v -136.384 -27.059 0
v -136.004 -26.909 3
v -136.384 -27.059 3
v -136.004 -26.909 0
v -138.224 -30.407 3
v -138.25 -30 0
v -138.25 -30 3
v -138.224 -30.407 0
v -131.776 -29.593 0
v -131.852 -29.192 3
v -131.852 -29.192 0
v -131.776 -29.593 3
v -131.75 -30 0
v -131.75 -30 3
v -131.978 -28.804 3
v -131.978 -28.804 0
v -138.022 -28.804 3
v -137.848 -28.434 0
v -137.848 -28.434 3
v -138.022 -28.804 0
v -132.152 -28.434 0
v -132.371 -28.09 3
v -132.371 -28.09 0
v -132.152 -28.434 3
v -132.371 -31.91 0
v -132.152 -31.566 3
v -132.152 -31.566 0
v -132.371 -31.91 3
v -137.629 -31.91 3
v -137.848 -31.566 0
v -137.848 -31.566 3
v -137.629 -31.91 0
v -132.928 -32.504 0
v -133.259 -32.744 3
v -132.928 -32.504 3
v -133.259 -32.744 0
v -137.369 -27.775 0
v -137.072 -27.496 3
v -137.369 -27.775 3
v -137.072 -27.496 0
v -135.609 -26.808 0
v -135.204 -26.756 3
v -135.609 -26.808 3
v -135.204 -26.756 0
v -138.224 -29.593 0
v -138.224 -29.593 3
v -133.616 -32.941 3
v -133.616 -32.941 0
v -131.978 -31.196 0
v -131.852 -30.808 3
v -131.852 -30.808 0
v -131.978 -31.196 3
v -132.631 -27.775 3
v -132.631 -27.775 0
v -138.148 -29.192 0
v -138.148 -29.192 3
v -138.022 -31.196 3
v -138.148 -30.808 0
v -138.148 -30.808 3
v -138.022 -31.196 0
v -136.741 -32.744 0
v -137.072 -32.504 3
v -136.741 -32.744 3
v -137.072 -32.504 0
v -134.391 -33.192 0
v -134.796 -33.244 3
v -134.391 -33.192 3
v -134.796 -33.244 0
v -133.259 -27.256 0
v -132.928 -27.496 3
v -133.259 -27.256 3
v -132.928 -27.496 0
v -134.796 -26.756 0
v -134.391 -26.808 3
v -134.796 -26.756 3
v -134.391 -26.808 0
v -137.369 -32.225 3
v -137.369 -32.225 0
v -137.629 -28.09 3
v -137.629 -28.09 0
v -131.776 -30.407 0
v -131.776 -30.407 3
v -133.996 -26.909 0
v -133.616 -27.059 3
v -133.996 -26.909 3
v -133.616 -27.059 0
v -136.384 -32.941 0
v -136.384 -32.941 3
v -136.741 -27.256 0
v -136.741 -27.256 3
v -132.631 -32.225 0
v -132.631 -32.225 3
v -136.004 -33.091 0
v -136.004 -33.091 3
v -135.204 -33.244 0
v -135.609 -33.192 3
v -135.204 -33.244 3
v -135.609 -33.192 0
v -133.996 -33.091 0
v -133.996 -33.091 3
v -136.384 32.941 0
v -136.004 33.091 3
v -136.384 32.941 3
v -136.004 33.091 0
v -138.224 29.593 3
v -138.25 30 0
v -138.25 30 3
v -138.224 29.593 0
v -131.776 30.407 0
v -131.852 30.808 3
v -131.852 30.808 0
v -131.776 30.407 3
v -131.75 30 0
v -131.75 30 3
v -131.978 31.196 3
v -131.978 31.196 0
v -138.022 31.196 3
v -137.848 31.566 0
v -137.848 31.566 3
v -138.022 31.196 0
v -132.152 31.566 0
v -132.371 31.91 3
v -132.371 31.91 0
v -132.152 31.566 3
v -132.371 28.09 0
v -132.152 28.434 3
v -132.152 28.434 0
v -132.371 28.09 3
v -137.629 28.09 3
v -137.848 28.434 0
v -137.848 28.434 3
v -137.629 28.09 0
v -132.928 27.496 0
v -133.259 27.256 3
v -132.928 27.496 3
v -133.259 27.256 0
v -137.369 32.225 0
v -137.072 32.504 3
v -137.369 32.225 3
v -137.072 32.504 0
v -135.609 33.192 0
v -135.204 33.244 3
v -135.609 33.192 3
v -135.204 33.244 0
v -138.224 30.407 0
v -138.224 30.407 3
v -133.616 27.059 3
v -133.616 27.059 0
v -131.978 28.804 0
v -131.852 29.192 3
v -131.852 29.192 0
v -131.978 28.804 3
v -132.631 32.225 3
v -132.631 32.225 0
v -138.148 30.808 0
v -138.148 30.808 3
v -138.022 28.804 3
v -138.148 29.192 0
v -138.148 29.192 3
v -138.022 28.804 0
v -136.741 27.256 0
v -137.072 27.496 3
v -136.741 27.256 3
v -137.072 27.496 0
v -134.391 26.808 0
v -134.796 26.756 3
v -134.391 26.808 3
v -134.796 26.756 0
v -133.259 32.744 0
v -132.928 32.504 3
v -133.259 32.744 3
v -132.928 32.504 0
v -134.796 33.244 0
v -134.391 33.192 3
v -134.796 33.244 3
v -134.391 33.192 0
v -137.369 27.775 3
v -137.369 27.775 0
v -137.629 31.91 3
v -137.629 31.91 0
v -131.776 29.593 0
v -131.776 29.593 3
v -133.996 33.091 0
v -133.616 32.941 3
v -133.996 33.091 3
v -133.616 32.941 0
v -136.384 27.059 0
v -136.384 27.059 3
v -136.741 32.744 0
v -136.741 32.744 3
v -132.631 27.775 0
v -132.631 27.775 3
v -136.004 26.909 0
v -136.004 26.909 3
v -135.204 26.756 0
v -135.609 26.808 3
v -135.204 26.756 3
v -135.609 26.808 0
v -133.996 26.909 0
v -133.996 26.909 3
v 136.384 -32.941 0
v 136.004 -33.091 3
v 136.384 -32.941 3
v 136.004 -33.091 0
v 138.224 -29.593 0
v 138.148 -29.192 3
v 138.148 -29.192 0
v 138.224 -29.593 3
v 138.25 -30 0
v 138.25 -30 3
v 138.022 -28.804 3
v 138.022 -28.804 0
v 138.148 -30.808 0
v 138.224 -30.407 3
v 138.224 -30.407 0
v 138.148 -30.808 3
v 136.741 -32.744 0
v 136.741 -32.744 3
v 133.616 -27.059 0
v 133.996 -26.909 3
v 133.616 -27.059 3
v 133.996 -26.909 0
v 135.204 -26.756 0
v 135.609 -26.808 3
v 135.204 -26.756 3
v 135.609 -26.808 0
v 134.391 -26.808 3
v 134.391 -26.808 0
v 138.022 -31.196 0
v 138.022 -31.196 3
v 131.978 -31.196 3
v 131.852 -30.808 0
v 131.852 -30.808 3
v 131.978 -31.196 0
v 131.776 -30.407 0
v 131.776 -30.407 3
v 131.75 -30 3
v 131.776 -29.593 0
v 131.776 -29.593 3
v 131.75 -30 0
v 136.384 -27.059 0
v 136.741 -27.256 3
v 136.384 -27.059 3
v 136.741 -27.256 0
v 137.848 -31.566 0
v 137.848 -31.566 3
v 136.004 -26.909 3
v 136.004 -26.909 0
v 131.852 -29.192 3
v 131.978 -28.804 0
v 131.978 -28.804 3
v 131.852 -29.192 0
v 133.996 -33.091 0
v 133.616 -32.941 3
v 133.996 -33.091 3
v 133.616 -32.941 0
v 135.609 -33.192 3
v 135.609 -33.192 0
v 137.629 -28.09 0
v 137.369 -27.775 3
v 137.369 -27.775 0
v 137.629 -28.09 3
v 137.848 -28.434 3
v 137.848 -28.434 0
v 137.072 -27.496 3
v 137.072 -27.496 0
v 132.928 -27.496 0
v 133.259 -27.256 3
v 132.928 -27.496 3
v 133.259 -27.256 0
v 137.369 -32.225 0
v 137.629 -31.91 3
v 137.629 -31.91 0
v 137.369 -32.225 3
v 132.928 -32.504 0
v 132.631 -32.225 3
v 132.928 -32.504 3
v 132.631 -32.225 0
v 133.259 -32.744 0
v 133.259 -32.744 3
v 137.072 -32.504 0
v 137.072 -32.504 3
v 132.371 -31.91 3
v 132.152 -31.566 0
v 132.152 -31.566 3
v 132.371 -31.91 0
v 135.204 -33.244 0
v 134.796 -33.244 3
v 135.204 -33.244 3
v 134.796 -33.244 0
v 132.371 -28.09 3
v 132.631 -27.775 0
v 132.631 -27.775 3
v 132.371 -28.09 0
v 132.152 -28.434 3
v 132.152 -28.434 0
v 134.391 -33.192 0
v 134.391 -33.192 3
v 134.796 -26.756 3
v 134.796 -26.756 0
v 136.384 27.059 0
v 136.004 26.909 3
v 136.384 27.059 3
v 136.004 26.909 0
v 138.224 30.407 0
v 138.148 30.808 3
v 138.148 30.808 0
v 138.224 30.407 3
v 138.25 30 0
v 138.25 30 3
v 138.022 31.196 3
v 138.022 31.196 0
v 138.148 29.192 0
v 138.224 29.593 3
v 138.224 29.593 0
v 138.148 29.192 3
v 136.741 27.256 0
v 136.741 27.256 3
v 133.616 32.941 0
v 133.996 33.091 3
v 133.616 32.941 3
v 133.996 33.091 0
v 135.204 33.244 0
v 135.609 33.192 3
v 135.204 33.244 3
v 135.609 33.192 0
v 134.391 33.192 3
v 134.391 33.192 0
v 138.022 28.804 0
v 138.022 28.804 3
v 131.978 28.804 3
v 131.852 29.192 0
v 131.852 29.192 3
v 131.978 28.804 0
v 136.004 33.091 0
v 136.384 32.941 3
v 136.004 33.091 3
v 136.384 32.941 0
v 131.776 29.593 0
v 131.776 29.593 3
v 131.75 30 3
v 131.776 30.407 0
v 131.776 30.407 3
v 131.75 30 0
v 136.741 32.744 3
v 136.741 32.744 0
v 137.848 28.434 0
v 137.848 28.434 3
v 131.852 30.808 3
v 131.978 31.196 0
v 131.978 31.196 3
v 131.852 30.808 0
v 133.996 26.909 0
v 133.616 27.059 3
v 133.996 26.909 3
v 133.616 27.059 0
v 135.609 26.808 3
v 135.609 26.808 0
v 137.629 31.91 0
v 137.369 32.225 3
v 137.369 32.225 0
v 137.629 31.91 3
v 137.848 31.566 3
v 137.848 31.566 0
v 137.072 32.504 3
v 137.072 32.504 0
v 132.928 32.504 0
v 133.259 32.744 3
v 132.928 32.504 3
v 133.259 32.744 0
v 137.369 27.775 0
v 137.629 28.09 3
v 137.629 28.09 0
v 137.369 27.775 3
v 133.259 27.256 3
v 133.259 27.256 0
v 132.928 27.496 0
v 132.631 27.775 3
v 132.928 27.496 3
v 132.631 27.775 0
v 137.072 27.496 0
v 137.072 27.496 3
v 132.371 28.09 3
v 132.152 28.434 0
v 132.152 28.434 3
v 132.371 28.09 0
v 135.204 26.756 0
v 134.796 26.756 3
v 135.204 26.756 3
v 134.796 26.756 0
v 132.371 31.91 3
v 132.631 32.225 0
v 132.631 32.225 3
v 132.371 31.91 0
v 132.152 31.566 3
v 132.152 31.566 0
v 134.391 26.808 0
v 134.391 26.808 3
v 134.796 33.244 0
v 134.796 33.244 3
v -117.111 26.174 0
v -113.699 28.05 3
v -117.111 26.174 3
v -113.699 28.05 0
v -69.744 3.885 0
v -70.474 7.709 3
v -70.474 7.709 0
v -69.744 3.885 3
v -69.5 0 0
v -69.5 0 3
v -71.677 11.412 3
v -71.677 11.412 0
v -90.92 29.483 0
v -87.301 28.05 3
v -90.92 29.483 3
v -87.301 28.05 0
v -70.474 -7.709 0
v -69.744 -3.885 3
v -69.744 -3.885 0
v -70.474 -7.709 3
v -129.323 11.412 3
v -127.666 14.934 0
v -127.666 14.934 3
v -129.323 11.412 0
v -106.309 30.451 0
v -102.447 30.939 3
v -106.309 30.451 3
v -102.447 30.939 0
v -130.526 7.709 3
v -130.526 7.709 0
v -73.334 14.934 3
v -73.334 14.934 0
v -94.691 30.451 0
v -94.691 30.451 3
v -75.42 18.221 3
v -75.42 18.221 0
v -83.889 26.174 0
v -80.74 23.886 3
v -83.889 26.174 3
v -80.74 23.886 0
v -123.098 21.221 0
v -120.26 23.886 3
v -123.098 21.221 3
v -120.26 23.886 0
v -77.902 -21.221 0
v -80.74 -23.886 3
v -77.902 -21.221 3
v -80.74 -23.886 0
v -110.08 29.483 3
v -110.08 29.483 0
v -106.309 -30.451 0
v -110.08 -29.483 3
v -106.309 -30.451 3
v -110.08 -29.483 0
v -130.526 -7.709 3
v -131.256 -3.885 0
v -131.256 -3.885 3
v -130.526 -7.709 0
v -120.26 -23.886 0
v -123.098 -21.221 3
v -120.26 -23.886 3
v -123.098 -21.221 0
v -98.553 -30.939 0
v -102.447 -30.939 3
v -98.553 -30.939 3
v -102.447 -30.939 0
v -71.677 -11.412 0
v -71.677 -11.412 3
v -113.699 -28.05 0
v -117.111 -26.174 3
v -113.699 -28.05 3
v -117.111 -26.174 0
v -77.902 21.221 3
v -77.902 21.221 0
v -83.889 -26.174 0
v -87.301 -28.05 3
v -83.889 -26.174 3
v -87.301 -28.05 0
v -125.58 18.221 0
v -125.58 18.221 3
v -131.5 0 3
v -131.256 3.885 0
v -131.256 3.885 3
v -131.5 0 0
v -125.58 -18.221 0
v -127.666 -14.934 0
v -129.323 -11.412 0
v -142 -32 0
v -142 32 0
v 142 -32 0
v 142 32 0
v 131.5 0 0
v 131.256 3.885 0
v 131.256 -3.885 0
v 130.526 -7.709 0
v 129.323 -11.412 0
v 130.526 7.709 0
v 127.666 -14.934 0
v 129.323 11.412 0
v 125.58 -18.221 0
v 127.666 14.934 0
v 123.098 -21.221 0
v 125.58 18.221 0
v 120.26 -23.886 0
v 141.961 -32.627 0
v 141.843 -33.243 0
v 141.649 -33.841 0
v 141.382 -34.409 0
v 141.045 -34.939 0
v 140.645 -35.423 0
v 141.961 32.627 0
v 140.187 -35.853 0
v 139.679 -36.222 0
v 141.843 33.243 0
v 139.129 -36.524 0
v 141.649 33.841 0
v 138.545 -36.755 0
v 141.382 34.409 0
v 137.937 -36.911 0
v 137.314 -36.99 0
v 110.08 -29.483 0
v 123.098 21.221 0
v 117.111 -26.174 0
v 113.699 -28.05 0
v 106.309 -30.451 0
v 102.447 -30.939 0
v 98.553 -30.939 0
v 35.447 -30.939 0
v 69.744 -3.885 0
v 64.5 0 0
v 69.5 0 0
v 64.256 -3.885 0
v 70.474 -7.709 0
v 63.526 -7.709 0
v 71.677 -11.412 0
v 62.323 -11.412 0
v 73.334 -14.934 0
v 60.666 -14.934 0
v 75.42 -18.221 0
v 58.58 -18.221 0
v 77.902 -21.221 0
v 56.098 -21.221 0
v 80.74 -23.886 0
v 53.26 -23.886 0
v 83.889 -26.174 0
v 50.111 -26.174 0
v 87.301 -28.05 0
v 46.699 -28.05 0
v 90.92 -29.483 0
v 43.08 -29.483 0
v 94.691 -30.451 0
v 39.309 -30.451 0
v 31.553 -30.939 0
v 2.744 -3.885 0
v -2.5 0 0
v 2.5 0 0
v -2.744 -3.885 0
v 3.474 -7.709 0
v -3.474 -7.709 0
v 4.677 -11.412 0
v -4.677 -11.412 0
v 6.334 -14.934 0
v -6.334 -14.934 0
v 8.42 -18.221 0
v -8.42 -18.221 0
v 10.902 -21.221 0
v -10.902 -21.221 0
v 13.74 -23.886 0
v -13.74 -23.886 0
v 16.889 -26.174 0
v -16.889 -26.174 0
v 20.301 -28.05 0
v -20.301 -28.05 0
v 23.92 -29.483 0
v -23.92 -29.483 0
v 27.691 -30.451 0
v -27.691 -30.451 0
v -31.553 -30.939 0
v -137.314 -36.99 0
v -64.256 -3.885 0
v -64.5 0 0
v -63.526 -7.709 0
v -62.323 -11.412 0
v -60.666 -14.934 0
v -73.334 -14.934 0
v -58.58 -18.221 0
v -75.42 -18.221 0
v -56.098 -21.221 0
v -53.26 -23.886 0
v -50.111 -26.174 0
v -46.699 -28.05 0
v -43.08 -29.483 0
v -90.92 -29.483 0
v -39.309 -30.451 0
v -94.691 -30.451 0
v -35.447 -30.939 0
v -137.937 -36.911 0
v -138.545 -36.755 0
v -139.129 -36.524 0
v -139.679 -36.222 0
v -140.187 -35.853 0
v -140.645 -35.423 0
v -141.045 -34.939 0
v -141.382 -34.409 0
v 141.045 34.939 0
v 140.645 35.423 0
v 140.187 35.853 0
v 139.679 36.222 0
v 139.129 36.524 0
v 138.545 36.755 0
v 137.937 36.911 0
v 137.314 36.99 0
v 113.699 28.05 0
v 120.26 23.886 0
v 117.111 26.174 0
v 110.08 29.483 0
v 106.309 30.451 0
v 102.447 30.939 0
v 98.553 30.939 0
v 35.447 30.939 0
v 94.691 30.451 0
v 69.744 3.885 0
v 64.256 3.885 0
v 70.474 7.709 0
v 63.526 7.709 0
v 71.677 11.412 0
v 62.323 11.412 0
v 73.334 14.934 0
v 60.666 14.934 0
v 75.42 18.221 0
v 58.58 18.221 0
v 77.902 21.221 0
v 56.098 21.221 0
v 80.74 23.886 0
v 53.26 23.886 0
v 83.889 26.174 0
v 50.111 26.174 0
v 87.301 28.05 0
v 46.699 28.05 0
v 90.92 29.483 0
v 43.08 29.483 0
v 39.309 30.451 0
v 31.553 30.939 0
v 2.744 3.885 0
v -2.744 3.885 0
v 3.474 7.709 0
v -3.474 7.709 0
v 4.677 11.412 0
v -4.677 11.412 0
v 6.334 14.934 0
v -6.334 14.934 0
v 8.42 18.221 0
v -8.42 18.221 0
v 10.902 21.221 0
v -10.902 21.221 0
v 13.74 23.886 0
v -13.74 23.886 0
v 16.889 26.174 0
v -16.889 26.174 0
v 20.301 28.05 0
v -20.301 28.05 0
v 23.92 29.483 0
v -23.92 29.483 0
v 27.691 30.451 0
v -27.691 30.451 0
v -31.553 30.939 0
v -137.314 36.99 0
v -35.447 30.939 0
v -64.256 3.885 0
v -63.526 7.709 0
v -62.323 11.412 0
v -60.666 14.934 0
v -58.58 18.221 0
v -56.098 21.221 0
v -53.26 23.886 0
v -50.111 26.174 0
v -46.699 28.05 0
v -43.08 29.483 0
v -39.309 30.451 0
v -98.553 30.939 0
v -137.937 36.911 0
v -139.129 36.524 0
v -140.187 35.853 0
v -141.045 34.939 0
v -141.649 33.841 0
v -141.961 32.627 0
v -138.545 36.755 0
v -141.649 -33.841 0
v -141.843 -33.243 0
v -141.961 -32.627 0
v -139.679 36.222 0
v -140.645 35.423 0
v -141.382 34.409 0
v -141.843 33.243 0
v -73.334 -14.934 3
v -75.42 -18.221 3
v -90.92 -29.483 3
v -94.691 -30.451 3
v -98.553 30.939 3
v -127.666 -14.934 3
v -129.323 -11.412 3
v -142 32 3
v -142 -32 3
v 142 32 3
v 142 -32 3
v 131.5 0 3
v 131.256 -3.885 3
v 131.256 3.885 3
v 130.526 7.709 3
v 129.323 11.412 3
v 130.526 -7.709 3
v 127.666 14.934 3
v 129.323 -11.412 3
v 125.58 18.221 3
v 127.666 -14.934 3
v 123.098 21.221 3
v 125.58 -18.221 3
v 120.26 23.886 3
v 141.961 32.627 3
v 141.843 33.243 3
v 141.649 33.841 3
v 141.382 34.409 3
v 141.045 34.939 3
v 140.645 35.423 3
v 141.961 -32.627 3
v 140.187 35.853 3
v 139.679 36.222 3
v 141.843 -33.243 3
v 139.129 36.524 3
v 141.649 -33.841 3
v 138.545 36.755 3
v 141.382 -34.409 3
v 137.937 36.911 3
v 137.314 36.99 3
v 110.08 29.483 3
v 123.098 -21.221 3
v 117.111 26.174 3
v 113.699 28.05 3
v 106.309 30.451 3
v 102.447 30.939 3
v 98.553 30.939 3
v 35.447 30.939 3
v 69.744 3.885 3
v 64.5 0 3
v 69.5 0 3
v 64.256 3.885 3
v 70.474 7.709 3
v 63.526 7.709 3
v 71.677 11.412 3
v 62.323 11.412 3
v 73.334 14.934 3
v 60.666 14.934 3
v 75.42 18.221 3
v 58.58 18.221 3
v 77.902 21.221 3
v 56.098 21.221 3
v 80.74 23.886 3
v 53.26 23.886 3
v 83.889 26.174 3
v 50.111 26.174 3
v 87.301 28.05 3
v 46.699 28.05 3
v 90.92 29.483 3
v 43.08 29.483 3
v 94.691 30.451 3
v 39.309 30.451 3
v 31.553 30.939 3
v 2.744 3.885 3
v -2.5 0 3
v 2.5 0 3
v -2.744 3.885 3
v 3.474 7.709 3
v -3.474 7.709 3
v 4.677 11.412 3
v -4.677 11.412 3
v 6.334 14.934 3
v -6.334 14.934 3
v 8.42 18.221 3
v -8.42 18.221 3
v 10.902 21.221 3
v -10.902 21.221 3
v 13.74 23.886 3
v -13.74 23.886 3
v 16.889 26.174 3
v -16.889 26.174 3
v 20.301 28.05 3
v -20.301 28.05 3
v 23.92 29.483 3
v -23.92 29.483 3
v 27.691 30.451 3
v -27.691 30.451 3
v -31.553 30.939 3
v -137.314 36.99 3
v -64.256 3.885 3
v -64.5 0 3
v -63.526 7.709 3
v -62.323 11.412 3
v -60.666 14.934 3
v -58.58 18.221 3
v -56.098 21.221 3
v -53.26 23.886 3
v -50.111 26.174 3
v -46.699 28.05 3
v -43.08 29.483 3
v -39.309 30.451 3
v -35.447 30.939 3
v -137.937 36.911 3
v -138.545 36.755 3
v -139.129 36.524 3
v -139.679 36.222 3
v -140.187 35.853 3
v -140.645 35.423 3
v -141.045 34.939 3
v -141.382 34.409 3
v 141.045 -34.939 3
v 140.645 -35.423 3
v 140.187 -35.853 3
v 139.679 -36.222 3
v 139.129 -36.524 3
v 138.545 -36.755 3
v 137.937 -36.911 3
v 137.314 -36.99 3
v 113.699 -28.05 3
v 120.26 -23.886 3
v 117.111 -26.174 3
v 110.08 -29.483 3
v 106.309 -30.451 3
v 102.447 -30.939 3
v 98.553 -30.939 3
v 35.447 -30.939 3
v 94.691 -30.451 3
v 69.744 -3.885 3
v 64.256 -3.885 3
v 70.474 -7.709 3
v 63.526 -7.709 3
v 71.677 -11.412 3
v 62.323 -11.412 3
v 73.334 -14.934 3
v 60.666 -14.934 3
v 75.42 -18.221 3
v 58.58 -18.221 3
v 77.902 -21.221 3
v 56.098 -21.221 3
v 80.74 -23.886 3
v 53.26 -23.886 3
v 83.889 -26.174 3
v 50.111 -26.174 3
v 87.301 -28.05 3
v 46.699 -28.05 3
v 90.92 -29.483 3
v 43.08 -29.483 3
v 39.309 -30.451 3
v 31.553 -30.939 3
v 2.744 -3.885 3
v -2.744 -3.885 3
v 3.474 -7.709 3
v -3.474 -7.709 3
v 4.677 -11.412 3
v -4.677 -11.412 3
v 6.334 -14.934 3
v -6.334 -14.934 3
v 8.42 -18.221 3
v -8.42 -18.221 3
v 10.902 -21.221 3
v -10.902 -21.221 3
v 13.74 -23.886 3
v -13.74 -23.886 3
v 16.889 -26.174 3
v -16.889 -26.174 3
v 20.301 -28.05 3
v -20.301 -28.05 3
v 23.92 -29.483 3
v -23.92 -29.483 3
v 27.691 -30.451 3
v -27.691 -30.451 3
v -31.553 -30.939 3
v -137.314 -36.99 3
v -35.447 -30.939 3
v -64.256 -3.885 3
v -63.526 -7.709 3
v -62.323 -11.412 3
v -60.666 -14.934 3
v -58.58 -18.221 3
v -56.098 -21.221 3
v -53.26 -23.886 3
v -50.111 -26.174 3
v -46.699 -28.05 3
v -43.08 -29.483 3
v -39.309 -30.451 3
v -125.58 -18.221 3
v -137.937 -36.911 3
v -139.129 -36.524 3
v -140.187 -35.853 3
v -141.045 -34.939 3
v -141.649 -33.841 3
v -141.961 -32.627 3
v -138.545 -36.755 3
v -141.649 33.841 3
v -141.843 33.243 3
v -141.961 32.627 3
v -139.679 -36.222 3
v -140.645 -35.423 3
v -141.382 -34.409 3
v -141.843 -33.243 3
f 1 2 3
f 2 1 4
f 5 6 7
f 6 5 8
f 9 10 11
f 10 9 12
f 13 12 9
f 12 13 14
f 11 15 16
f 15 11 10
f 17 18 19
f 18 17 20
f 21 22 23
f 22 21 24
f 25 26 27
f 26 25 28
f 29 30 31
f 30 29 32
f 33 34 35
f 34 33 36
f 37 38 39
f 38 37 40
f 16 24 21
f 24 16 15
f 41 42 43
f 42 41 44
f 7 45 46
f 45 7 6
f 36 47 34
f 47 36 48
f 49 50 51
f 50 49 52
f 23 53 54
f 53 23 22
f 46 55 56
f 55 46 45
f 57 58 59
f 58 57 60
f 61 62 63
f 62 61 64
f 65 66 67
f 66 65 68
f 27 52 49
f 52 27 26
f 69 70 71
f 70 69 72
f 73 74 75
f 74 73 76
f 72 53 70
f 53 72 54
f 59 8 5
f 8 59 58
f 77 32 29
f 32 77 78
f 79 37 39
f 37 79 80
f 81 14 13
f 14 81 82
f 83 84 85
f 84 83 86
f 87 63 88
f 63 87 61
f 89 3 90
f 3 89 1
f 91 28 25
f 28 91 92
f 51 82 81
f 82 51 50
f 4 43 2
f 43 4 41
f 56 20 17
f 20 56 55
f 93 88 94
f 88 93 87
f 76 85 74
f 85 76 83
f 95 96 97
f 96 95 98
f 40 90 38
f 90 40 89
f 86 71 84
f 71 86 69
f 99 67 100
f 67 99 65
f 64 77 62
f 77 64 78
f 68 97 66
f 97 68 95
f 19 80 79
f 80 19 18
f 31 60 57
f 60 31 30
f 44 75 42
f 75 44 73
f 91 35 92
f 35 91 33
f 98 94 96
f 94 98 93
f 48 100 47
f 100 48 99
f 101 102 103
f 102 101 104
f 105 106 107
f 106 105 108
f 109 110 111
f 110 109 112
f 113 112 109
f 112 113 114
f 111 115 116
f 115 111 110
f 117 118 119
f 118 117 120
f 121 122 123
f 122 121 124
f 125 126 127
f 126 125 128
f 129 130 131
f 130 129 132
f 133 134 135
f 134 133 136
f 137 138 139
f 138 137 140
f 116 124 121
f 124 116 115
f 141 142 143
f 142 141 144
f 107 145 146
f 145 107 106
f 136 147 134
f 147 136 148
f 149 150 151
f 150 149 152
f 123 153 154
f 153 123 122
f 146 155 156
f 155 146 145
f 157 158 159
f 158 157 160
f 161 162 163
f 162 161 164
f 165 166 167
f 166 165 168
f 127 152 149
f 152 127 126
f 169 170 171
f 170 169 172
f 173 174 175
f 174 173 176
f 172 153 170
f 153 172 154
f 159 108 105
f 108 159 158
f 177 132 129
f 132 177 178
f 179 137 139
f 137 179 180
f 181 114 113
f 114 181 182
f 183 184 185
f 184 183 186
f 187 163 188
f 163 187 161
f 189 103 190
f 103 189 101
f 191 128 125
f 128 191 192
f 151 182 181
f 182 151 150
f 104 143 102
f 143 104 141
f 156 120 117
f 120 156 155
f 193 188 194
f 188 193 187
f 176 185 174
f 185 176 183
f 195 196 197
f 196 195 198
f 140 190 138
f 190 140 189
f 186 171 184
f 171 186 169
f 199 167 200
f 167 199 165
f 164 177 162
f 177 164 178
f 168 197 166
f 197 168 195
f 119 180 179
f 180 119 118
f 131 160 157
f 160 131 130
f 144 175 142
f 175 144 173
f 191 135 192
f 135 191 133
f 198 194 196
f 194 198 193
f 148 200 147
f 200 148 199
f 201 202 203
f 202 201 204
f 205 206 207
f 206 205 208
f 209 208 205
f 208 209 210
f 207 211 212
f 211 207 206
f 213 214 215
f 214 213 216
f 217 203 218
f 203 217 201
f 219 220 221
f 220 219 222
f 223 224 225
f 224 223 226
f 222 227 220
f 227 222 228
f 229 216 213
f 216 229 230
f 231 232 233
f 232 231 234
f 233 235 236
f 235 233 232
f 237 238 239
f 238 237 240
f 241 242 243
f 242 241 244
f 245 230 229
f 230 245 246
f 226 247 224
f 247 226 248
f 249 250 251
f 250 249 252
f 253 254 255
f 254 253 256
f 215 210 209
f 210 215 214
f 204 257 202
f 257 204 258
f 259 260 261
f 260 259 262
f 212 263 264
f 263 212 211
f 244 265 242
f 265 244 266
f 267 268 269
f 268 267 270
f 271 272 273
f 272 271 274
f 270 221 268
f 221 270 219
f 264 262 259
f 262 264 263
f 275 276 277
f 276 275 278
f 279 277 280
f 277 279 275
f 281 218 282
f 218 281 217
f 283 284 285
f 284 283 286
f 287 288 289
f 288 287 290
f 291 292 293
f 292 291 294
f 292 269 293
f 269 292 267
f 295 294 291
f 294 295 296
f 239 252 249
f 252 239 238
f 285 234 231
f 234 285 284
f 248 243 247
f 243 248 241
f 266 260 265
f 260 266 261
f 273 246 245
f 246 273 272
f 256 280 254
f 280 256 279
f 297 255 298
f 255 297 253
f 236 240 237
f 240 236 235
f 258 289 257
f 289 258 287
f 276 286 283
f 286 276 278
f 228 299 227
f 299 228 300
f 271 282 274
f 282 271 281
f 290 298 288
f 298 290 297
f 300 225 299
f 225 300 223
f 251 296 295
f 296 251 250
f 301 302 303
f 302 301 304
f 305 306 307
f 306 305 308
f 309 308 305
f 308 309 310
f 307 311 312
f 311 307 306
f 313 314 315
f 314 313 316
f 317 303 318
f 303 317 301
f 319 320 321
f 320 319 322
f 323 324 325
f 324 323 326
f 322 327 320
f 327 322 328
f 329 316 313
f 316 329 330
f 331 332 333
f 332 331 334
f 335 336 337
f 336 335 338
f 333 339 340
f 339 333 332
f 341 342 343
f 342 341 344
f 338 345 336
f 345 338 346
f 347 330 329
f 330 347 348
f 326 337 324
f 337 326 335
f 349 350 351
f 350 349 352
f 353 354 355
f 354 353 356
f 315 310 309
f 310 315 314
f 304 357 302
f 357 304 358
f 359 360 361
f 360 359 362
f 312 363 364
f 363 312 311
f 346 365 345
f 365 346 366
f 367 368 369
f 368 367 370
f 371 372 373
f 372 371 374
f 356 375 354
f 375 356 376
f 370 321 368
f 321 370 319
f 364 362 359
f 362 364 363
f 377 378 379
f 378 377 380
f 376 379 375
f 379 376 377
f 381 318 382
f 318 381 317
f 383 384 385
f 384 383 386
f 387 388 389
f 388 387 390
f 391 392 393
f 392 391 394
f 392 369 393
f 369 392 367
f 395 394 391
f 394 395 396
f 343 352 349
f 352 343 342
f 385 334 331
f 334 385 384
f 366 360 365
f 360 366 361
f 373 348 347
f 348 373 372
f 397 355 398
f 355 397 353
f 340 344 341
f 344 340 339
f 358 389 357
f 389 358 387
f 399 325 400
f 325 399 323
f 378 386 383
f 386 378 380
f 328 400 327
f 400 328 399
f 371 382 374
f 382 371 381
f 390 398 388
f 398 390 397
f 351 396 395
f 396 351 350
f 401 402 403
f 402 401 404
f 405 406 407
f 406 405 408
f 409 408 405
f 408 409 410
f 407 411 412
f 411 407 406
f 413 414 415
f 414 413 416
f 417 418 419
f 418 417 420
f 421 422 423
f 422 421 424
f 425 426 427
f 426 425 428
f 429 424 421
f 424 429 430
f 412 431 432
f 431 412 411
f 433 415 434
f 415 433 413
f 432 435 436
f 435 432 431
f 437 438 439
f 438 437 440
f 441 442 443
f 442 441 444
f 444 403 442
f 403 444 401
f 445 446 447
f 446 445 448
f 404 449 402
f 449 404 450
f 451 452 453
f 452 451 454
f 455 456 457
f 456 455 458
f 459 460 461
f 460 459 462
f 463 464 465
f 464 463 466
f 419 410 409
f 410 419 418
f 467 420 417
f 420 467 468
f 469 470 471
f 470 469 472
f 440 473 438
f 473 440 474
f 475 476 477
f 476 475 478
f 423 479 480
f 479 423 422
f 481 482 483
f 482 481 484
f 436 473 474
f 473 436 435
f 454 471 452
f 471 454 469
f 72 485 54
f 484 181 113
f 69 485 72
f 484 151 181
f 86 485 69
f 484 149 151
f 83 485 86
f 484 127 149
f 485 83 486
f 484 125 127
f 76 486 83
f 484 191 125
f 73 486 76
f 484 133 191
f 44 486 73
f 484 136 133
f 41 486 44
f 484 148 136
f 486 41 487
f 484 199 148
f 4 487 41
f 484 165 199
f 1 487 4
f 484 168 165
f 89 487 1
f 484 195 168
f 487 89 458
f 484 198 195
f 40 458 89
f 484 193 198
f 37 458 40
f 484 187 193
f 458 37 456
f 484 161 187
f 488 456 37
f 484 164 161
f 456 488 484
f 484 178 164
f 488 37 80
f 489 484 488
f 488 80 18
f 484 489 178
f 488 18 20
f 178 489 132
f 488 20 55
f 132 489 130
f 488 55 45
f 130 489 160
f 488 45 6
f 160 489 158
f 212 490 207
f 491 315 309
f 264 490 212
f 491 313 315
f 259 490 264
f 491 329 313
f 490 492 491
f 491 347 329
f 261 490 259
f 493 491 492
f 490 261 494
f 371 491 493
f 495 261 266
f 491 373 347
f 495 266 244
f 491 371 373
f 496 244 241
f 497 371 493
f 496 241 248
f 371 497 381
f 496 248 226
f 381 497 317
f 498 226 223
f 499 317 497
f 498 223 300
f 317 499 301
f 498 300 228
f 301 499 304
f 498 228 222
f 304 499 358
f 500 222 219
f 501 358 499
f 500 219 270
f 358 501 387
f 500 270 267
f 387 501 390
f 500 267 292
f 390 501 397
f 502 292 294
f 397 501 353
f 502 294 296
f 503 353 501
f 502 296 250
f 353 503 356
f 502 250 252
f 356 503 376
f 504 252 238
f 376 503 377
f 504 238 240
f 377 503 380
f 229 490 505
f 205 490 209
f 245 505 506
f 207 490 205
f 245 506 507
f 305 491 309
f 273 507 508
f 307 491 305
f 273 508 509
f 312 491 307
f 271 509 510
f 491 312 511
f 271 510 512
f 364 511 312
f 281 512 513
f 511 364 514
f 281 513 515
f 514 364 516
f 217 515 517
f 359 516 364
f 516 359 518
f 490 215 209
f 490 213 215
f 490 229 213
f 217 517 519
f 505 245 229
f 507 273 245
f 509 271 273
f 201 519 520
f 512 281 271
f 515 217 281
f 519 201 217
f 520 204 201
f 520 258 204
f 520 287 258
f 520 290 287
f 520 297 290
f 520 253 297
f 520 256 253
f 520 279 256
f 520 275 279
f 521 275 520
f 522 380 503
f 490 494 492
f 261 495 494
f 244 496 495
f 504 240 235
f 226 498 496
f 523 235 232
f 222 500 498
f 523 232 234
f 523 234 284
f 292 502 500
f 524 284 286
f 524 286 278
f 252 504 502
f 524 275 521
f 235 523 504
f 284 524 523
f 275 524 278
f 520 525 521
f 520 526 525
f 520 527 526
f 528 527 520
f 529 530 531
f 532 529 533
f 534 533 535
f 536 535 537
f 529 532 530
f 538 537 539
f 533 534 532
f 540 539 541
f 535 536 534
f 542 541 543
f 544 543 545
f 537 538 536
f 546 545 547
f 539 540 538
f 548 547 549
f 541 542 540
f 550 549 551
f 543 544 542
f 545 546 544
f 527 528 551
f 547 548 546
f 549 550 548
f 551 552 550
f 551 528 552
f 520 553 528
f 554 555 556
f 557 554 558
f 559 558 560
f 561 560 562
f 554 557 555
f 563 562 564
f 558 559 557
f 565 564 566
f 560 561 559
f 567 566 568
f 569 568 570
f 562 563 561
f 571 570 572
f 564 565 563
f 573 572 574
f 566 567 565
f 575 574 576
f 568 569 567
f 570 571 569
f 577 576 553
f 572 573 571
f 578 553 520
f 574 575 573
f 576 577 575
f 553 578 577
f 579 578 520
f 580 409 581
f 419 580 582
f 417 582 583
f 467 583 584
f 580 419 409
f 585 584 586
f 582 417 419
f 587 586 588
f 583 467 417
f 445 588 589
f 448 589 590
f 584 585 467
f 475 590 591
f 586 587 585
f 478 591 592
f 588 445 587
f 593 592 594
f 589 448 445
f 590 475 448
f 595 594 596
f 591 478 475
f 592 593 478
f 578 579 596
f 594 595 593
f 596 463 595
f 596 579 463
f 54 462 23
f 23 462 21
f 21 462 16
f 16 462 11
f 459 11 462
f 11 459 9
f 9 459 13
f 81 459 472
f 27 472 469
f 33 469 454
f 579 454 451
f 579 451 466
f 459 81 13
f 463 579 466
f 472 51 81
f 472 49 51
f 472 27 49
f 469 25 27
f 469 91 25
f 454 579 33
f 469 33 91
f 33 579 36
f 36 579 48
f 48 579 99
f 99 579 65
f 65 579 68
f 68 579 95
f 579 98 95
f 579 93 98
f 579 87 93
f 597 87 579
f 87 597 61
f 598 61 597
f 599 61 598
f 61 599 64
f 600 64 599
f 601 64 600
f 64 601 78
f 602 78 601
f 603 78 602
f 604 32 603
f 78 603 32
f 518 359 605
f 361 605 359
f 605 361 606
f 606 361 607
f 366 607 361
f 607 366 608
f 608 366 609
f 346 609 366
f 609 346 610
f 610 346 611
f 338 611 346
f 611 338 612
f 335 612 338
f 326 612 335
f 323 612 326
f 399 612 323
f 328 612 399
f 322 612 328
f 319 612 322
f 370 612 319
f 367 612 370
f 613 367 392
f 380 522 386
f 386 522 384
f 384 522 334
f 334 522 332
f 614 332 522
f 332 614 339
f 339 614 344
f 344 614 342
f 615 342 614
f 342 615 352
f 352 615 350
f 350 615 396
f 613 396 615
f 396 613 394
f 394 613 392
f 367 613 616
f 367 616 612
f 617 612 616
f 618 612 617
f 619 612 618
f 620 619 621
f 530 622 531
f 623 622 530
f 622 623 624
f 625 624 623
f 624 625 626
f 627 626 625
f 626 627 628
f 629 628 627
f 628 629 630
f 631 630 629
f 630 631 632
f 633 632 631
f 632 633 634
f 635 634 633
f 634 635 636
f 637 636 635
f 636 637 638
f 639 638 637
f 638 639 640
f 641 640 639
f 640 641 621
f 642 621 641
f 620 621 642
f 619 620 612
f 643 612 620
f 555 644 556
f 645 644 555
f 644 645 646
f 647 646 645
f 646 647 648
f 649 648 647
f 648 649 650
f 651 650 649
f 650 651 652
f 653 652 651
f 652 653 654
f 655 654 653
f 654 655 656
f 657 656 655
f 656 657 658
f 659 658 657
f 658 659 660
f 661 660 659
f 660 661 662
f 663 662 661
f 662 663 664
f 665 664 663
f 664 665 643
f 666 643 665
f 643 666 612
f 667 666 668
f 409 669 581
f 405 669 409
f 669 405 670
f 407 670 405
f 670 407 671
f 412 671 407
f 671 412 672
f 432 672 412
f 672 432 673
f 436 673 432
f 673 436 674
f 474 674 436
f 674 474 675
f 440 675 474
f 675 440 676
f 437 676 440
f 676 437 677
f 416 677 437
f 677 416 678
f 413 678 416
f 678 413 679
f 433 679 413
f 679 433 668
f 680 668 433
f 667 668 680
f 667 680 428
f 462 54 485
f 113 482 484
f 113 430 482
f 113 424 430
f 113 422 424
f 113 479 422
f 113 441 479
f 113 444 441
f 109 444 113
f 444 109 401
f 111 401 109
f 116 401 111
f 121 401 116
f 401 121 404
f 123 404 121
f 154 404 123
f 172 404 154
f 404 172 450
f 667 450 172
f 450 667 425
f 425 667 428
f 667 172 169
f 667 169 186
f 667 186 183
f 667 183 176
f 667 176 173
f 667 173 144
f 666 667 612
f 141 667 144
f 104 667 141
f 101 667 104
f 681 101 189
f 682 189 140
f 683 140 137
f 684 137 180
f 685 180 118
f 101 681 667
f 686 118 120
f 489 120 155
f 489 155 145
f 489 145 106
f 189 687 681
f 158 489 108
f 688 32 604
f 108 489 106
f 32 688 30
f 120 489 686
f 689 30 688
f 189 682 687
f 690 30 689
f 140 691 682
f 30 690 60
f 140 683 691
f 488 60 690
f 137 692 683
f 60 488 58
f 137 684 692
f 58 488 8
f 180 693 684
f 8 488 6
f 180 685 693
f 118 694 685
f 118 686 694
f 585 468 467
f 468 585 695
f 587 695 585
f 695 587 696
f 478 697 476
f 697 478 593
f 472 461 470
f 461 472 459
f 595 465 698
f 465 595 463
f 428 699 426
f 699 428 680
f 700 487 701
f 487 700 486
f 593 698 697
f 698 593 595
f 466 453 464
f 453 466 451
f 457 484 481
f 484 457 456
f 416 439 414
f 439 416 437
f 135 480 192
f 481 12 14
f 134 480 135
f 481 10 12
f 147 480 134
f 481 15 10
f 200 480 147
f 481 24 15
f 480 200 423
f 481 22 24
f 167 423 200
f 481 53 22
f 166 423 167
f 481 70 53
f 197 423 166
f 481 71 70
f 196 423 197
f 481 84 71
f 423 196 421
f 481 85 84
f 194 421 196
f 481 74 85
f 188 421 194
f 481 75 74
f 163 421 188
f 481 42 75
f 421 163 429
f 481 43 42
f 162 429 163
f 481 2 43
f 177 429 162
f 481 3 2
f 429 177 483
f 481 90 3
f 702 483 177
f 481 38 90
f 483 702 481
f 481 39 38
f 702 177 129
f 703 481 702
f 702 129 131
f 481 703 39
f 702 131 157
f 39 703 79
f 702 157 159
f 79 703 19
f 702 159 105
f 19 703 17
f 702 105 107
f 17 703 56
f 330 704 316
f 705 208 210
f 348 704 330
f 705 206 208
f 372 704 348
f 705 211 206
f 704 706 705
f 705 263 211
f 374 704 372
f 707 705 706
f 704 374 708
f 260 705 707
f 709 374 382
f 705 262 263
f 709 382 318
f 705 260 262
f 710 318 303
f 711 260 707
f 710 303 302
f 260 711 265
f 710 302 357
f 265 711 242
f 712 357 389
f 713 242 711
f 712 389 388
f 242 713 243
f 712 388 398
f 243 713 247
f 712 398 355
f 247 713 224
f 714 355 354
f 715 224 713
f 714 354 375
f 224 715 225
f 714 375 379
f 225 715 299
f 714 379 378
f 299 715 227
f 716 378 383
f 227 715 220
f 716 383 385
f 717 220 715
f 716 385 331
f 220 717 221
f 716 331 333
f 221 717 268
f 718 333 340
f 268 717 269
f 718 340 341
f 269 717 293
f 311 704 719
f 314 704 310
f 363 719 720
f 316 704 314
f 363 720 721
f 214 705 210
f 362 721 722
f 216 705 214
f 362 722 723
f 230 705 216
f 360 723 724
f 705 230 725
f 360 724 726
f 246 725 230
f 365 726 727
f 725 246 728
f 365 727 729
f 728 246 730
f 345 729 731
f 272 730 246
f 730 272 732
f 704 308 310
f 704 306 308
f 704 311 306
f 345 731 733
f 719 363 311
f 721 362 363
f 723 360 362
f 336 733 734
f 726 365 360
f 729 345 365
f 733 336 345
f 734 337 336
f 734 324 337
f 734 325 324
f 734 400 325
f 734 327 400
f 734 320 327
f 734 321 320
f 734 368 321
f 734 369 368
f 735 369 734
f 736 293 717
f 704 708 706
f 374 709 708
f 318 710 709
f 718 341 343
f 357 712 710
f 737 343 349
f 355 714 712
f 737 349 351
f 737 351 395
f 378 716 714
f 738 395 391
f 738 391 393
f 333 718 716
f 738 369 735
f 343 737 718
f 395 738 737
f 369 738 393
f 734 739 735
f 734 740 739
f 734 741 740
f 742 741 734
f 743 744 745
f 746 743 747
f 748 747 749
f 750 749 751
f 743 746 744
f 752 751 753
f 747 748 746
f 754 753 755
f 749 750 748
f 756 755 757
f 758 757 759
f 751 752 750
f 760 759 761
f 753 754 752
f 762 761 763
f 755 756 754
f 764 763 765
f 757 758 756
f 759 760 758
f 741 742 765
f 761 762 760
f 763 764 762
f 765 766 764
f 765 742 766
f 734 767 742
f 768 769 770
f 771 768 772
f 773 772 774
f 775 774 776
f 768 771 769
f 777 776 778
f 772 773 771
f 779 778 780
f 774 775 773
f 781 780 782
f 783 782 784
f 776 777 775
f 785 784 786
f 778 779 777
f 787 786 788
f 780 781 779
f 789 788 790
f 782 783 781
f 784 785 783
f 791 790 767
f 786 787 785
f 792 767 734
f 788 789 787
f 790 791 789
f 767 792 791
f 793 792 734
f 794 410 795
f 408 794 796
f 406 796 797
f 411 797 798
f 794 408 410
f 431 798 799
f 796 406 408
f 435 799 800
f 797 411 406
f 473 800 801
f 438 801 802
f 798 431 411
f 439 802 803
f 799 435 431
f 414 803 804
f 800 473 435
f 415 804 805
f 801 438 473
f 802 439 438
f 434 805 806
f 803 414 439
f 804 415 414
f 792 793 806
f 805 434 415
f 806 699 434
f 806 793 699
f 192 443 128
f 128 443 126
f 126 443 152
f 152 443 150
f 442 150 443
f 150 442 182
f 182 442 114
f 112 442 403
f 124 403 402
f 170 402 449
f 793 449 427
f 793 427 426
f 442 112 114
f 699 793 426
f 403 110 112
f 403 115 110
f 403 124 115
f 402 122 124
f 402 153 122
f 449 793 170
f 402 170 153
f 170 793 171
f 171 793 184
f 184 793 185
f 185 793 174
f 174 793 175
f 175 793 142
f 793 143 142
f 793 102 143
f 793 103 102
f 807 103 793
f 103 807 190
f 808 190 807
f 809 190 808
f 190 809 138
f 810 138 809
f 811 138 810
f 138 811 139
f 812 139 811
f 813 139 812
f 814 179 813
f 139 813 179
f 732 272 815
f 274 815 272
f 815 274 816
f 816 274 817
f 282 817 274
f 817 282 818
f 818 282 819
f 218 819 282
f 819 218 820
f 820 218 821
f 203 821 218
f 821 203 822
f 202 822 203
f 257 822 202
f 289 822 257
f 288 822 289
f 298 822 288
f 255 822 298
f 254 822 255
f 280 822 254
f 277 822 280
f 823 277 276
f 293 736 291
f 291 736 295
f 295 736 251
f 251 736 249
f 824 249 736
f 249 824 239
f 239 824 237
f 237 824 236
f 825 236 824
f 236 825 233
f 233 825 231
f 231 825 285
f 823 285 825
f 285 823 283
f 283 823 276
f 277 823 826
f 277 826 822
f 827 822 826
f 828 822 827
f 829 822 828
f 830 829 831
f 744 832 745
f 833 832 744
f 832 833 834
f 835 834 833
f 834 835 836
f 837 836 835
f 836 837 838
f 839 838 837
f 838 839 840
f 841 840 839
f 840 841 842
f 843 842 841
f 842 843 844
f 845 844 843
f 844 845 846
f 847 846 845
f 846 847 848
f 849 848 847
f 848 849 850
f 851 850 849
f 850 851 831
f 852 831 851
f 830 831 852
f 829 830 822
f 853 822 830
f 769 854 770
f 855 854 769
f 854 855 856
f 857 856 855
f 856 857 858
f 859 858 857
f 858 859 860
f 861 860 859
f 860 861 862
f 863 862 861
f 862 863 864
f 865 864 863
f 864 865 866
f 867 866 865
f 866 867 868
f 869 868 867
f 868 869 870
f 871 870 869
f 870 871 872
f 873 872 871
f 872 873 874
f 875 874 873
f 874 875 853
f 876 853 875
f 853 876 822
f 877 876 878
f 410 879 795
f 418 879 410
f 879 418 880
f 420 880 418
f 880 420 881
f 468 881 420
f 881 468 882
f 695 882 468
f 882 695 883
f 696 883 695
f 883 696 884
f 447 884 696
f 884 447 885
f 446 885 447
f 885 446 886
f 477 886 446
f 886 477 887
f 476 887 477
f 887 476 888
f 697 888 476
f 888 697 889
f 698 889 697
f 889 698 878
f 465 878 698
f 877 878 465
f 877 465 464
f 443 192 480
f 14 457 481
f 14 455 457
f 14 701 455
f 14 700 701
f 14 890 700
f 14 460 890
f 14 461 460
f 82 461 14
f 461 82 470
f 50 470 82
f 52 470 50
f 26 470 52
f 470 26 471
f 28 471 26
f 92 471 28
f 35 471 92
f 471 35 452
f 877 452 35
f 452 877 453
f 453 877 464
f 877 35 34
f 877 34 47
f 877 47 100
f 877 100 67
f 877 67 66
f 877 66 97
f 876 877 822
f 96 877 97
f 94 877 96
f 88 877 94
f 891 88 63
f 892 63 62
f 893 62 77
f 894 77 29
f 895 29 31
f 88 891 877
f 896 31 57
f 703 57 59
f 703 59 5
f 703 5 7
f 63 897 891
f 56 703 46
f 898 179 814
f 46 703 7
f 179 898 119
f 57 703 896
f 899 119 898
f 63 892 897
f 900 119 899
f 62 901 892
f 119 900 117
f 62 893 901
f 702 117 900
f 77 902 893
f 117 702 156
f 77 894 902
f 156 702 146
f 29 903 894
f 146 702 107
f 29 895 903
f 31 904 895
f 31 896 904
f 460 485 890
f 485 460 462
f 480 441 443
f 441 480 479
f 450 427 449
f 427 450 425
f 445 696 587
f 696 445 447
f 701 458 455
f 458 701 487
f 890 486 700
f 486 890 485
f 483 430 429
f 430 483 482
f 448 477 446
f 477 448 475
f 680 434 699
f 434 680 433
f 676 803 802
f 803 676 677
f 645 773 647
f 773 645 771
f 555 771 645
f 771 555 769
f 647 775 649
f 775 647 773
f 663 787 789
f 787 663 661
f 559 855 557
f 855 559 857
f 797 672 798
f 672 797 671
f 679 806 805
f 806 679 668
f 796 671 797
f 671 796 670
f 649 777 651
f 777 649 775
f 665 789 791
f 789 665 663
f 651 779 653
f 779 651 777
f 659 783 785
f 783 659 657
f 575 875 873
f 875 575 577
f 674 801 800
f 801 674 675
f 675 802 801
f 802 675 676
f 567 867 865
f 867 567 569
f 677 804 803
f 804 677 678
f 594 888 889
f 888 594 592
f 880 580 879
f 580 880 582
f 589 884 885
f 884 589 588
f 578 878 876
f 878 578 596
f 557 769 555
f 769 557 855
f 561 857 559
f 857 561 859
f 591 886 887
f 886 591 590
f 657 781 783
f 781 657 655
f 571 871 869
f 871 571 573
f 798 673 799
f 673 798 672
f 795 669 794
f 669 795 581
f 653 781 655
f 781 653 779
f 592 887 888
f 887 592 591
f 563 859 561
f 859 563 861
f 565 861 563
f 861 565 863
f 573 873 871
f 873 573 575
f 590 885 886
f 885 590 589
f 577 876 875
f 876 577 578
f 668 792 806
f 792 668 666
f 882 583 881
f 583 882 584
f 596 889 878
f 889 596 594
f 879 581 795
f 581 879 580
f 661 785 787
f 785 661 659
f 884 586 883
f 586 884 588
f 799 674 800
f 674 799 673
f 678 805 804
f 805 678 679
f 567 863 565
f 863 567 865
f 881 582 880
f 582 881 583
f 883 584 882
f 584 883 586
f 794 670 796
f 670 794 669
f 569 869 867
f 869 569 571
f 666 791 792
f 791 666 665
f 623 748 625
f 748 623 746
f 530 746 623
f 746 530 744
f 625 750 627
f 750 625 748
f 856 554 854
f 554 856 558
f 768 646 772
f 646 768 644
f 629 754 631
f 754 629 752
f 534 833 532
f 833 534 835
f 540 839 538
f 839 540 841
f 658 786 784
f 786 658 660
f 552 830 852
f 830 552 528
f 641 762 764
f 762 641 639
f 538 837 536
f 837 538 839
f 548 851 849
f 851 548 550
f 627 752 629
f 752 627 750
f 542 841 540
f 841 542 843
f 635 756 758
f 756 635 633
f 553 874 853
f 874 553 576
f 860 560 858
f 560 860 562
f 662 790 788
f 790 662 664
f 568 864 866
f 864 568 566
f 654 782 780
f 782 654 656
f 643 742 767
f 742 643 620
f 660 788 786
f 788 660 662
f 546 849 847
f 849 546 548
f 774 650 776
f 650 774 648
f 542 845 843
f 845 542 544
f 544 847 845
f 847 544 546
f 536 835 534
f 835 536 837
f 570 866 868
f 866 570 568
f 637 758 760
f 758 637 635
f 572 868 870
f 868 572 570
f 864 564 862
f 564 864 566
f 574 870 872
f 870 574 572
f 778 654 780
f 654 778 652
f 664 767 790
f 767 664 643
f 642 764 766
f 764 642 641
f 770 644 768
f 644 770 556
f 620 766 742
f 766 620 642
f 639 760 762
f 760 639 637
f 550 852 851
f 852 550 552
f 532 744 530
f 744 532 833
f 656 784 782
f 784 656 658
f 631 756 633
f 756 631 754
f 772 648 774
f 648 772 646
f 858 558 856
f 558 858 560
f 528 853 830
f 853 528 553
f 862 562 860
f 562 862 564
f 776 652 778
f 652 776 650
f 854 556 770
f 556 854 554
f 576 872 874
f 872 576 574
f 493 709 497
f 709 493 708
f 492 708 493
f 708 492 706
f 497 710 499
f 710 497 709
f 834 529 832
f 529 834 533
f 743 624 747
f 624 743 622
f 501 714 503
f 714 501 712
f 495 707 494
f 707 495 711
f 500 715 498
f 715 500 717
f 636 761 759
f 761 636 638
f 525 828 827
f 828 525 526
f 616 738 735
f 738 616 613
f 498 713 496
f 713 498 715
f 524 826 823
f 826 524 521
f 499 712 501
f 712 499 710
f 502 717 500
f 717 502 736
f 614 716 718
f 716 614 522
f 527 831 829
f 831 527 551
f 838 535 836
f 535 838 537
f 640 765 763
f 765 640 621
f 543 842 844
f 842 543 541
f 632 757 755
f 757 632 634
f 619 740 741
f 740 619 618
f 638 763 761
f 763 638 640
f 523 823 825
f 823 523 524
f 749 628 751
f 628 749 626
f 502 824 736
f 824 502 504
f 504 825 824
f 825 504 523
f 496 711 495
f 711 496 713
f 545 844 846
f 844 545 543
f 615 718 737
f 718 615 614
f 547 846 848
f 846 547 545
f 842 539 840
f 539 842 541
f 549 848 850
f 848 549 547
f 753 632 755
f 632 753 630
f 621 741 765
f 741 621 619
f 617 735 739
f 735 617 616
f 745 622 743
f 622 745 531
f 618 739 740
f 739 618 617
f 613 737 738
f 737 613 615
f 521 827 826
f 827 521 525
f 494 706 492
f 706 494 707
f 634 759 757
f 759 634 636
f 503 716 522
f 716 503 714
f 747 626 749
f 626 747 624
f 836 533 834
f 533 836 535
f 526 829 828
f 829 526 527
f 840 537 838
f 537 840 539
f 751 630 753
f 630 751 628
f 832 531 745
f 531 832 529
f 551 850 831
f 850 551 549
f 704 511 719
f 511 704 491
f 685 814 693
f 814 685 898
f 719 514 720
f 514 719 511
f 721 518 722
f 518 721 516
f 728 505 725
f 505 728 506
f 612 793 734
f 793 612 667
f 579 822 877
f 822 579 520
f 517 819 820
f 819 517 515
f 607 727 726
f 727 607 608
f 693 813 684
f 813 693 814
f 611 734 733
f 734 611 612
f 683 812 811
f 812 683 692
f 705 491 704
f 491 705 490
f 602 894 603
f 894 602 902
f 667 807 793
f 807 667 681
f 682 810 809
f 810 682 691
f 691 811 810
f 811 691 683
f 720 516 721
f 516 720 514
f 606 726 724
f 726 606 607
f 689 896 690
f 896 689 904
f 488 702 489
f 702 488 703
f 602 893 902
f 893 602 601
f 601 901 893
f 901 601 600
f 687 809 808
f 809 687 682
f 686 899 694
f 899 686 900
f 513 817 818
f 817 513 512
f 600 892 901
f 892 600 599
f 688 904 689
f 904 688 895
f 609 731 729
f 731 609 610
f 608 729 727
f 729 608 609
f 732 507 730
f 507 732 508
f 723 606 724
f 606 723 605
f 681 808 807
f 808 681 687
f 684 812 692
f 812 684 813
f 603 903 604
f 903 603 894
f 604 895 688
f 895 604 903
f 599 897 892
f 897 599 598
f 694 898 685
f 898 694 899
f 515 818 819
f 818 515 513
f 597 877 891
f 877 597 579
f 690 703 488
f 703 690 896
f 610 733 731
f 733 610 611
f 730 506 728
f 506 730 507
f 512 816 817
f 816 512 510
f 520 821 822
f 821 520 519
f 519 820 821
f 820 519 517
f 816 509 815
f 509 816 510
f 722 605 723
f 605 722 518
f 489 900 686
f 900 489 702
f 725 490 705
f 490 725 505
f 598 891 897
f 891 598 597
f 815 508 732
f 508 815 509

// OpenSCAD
$fn = 50;


difference() {
	union() {
		hull() {
			translate(v = [-137.0000000000, 32.0000000000, 0]) {
				cylinder(h = 3, r = 5);
			}
			translate(v = [137.0000000000, 32.0000000000, 0]) {
				cylinder(h = 3, r = 5);
			}
			translate(v = [-137.0000000000, -32.0000000000, 0]) {
				cylinder(h = 3, r = 5);
			}
			translate(v = [137.0000000000, -32.0000000000, 0]) {
				cylinder(h = 3, r = 5);
			}
		}
	}
	union() {
		#translate(v = [-135.0000000000, -30.0000000000, -100.0000000000]) {
			cylinder(h = 200, r = 3.2500000000);
		}
		#translate(v = [-135.0000000000, 30.0000000000, -100.0000000000]) {
			cylinder(h = 200, r = 3.2500000000);
		}
		#translate(v = [135.0000000000, -30.0000000000, -100.0000000000]) {
			cylinder(h = 200, r = 3.2500000000);
		}
		#translate(v = [135.0000000000, 30.0000000000, -100.0000000000]) {
			cylinder(h = 200, r = 3.2500000000);
		}
		#translate(v = [-100.5000000000, 0, 0]) {
			cylinder(h = 3, r = 31.0000000000);
		}
		#translate(v = [-33.5000000000, 0, 0]) {
			cylinder(h = 3, r = 31.0000000000);
		}
		#translate(v = [33.5000000000, 0, 0]) {
			cylinder(h = 3, r = 31.0000000000);
		}
		#translate(v = [100.5000000000, 0, 0]) {
			cylinder(h = 3, r = 31.0000000000);
		}
	}
}
